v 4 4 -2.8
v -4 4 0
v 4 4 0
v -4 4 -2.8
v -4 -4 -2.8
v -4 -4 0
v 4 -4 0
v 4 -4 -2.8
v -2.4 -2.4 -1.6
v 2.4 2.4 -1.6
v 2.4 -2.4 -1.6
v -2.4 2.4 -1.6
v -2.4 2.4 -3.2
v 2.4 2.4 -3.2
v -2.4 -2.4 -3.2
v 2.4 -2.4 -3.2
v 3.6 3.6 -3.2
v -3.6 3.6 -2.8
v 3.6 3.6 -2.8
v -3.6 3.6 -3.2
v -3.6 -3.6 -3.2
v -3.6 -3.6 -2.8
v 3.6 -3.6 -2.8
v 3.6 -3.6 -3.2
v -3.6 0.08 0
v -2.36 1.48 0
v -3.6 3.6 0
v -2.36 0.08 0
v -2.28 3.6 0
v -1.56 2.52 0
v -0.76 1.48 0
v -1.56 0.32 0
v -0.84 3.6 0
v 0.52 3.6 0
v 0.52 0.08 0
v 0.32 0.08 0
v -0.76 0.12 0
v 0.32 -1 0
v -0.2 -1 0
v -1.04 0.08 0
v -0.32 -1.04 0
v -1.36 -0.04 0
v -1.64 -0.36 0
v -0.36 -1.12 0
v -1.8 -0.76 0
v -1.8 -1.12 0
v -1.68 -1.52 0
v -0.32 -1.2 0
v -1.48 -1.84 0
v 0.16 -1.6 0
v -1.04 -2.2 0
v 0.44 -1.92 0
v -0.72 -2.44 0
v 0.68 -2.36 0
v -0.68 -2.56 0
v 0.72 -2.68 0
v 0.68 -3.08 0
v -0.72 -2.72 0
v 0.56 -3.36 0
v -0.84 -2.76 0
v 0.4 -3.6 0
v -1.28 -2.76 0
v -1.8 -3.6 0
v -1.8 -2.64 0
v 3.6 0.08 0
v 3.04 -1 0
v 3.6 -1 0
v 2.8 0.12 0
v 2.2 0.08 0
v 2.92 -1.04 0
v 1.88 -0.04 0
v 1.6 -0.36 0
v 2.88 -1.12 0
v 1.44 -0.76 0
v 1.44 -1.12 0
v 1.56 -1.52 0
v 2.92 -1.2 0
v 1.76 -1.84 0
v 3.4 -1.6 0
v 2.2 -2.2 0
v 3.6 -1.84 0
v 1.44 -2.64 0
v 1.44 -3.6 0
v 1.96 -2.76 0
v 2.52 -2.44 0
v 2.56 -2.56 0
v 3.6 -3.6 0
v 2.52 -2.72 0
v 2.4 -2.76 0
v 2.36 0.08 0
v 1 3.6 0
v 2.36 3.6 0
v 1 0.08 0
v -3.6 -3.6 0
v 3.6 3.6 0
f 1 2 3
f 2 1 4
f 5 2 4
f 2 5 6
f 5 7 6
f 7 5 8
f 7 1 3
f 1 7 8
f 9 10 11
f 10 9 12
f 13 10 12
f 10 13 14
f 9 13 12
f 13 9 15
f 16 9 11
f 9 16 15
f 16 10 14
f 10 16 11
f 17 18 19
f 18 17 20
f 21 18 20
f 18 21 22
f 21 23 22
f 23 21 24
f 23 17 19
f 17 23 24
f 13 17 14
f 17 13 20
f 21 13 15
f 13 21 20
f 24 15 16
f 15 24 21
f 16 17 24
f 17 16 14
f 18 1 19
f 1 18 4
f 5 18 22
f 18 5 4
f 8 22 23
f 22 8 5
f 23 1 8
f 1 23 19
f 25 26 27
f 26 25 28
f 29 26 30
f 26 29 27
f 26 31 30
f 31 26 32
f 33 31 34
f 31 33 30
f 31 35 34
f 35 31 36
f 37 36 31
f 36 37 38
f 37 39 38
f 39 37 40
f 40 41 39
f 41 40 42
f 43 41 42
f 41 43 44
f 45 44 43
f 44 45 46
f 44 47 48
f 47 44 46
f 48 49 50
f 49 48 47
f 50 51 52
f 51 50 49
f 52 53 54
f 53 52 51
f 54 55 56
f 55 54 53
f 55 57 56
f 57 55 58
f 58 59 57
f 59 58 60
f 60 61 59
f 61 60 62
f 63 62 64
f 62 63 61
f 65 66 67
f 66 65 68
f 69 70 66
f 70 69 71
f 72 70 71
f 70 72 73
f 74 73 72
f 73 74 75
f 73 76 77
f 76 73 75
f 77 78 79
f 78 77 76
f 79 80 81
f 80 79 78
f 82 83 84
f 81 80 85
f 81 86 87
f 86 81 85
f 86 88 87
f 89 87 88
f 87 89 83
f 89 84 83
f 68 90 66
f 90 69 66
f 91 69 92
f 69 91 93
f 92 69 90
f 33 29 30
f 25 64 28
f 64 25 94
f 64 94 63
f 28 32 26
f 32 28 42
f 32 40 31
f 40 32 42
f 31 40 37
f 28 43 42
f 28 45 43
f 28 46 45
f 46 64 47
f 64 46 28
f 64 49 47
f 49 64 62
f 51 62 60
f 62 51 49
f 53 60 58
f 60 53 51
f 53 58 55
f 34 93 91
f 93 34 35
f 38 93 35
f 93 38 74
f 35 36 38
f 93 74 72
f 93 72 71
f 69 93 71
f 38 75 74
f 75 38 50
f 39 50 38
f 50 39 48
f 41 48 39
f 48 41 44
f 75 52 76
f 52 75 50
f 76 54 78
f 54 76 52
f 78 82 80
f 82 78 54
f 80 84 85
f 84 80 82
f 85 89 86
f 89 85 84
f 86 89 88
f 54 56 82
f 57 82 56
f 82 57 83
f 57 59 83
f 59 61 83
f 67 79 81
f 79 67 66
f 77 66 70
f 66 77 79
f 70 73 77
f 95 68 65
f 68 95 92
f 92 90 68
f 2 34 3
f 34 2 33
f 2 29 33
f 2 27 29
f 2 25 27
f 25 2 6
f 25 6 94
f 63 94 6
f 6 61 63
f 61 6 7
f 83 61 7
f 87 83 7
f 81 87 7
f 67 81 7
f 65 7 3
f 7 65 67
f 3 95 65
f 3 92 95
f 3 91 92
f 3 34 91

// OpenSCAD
// file: ../p/box5.scad
use <../lib.scad>
function ldraw_lib__box5() = [
// 0 Box with 5 Faces and All Edges
// 0 Name: box5.dat
// 0 Author: James Jessiman
// 0 !LDRAW_ORG Primitive UPDATE 2012-01
// 0 !LICENSE Licensed under CC BY 2.0 and CC BY 4.0 : see CAreadme.txt
// 
// 0 BFC CERTIFY CCW
  [0,"BFC","CERTIFY"],
  [0,"BFC","CCW"],
// 
// 0 !HISTORY 2002-04-03 [sbliss] Modified for BFC compliance
// 0 !HISTORY 2002-04-25 [PTadmin] Official Update 2002-02
// 0 !HISTORY 2007-06-24 [PTadmin] Header formatted for Contributor Agreement
// 0 !HISTORY 2008-07-01 [PTadmin] Official Update 2008-01
// 0 !HISTORY 2012-02-16 [Philo] Changed to CCW
// 0 !HISTORY 2012-03-30 [PTadmin] Official Update 2012-01
// 
// 
// 2 24 1 1 1 -1 1 1
  [2,24,1,1,1,-1,1,1],
// 2 24 -1 1 1 -1 1 -1
  [2,24,-1,1,1,-1,1,-1],
// 2 24 -1 1 -1 1 1 -1
  [2,24,-1,1,-1,1,1,-1],
// 2 24 1 1 -1 1 1 1
  [2,24,1,1,-1,1,1,1],
// 2 24 1 0 1 -1 0 1
  [2,24,1,0,1,-1,0,1],
// 2 24 -1 0 1 -1 0 -1
  [2,24,-1,0,1,-1,0,-1],
// 2 24 -1 0 -1 1 0 -1
  [2,24,-1,0,-1,1,0,-1],
// 2 24 1 0 -1 1 0 1
  [2,24,1,0,-1,1,0,1],
// 2 24 1 0 1 1 1 1
  [2,24,1,0,1,1,1,1],
// 2 24 -1 0 1 -1 1 1
  [2,24,-1,0,1,-1,1,1],
// 2 24 1 0 -1 1 1 -1
  [2,24,1,0,-1,1,1,-1],
// 2 24 -1 0 -1 -1 1 -1
  [2,24,-1,0,-1,-1,1,-1],
// 4 16 -1 1 1 1 1 1 1 1 -1 -1 1 -1
  [4,16,-1,1,1,1,1,1,1,1,-1,-1,1,-1],
// 4 16 -1 1 1 -1 0 1 1 0 1 1 1 1
  [4,16,-1,1,1,-1,0,1,1,0,1,1,1,1],
// 4 16 -1 1 -1 -1 0 -1 -1 0 1 -1 1 1
  [4,16,-1,1,-1,-1,0,-1,-1,0,1,-1,1,1],
// 4 16 1 1 -1 1 0 -1 -1 0 -1 -1 1 -1
  [4,16,1,1,-1,1,0,-1,-1,0,-1,-1,1,-1],
// 4 16 1 1 1 1 0 1 1 0 -1 1 1 -1
  [4,16,1,1,1,1,0,1,1,0,-1,1,1,-1],
];
makepoly(ldraw_lib__box5(), line=0.2);
// file: ../p/box4.scad
use <../lib.scad>
function ldraw_lib__box4() = [
// 0 Box with 4 Faces (2 Parallel Pairs) and All Edges
// 0 Name: box4.dat
// 0 Author: James Jessiman
// 0 !LDRAW_ORG Primitive UPDATE 2012-01
// 0 !LICENSE Licensed under CC BY 2.0 and CC BY 4.0 : see CAreadme.txt
// 
// 0 BFC CERTIFY CCW
  [0,"BFC","CERTIFY"],
  [0,"BFC","CCW"],
// 
// 0 !HISTORY 2002-04-03 [sbliss] Modified for BFC compliance
// 0 !HISTORY 2002-04-25 [PTadmin] Official Update 2002-02
// 0 !HISTORY 2007-06-24 [PTadmin] Header formatted for Contributor Agreement
// 0 !HISTORY 2008-07-01 [PTadmin] Official Update 2008-01
// 0 !HISTORY 2012-02-16 [Philo] Changed to CCW
// 0 !HISTORY 2012-03-30 [PTadmin] Official Update 2012-01
// 
// 
// 2 24 1 1 1 -1 1 1
  [2,24,1,1,1,-1,1,1],
// 2 24 -1 1 1 -1 1 -1
  [2,24,-1,1,1,-1,1,-1],
// 2 24 -1 1 -1 1 1 -1
  [2,24,-1,1,-1,1,1,-1],
// 2 24 1 1 -1 1 1 1
  [2,24,1,1,-1,1,1,1],
// 2 24 1 0 1 -1 0 1
  [2,24,1,0,1,-1,0,1],
// 2 24 -1 0 1 -1 0 -1
  [2,24,-1,0,1,-1,0,-1],
// 2 24 -1 0 -1 1 0 -1
  [2,24,-1,0,-1,1,0,-1],
// 2 24 1 0 -1 1 0 1
  [2,24,1,0,-1,1,0,1],
// 2 24 1 0 1 1 1 1
  [2,24,1,0,1,1,1,1],
// 2 24 -1 0 1 -1 1 1
  [2,24,-1,0,1,-1,1,1],
// 2 24 1 0 -1 1 1 -1
  [2,24,1,0,-1,1,1,-1],
// 2 24 -1 0 -1 -1 1 -1
  [2,24,-1,0,-1,-1,1,-1],
// 4 16 -1 1 1 -1 0 1 1 0 1 1 1 1
  [4,16,-1,1,1,-1,0,1,1,0,1,1,1,1],
// 4 16 -1 1 -1 -1 0 -1 -1 0 1 -1 1 1
  [4,16,-1,1,-1,-1,0,-1,-1,0,1,-1,1,1],
// 4 16 1 1 -1 1 0 -1 -1 0 -1 -1 1 -1
  [4,16,1,1,-1,1,0,-1,-1,0,-1,-1,1,-1],
// 4 16 1 1 1 1 0 1 1 0 -1 1 1 -1
  [4,16,1,1,1,1,0,1,1,0,-1,1,1,-1],
];
makepoly(ldraw_lib__box4(), line=0.2);
// file: s/3070bs01.scad
use <../../lib.scad>
use <../../p/box4.scad>
use <../../p/box5.scad>
function ldraw_lib__s__3070bs01() = [
// 0 ~Tile  1 x  1 with Groove without Top Face
// 0 Name: s\3070bs01.dat
// 0 Author: Chris Dee [cwdee]
// 0 !LDRAW_ORG Subpart UPDATE 2009-02
// 0 !LICENSE Licensed under CC BY 2.0 and CC BY 4.0 : see CAreadme.txt
// 
// 0 BFC CERTIFY CCW
  [0,"BFC","CERTIFY"],
  [0,"BFC","CCW"],
// 
// 0 !HISTORY 2009-09-03 [PTadmin] Official Update 2009-02
// 
// 
// 1 16 0 0 0 10 0 0 0 7 0 0 0 10 box4.dat
  [1,16,0,0,0,10,0,0,0,7,0,0,0,10, ldraw_lib__box4()],
// 0 BFC INVERTNEXT
  [0,"BFC","INVERTNEXT"],
// 1 16 0 8 0 6 0 0 0 -4 0 0 0 6 box5.dat
  [1,16,0,8,0,6,0,0,0,-4,0,0,0,6, ldraw_lib__box5()],
// 1 16 0 7 0 9 0 0 0 1 0 0 0 9 box4.dat
  [1,16,0,7,0,9,0,0,0,1,0,0,0,9, ldraw_lib__box4()],
// 
// 4 16 9 8 9 6 8 6 -6 8 6 -9 8 9
  [4,16,9,8,9,6,8,6,-6,8,6,-9,8,9],
// 4 16 -9 8 9 -6 8 6 -6 8 -6 -9 8 -9
  [4,16,-9,8,9,-6,8,6,-6,8,-6,-9,8,-9],
// 4 16 -9 8 -9 -6 8 -6 6 8 -6 9 8 -9
  [4,16,-9,8,-9,-6,8,-6,6,8,-6,9,8,-9],
// 4 16 9 8 -9 6 8 -6 6 8 6 9 8 9
  [4,16,9,8,-9,6,8,-6,6,8,6,9,8,9],
// 
// 4 16 10 7 10 9 7 9 -9 7 9 -10 7 10
  [4,16,10,7,10,9,7,9,-9,7,9,-10,7,10],
// 4 16 -10 7 10 -9 7 9 -9 7 -9 -10 7 -10
  [4,16,-10,7,10,-9,7,9,-9,7,-9,-10,7,-10],
// 4 16 -10 7 -10 -9 7 -9 9 7 -9 10 7 -10
  [4,16,-10,7,-10,-9,7,-9,9,7,-9,10,7,-10],
// 4 16 10 7 -10 9 7 -9 9 7 9 10 7 10
  [4,16,10,7,-10,9,7,-9,9,7,9,10,7,10],
// 0
];
makepoly(ldraw_lib__s__3070bs01(), line=0.2);
// main file
use <../lib.scad>
use <s/3070bs01.scad>
function ldraw_lib__3070bp17() = [
// 0 Tile  1 x  1 with Blue "MISS" on Dark Turquoise Background Pattern
// 0 Name: 3070bp17.dat
// 0 Author: Takeshi Takahashi [RainbowDolphin]
// 0 !LDRAW_ORG Part UPDATE 2022-01
// 0 !LICENSE Licensed under CC BY 2.0 and CC BY 4.0 : see CAreadme.txt
// 
// 0 BFC CERTIFY CCW
  [0,"BFC","CERTIFY"],
  [0,"BFC","CCW"],
// 
// 0 !KEYWORDS Bricklink 3070bpb157, Dots, Set 41916
// 
// 0 !HISTORY 2022-01-14 [PTadmin] Official Update 2022-01
// 
// 
// 1 16 0 0 0 1 0 0 0 1 0 0 0 1 s\3070bs01.dat
  [1,16,0,0,0,1,0,0,0,1,0,0,0,1, ldraw_lib__s__3070bs01()],
// 4 1 -9 0 9 -9 0 0.2 -5.9 0 0.2 -5.9 0 3.7
  [4,1,-9,0,9,-9,0,0.2,-5.9,0,0.2,-5.9,0,3.7],
// 4 1 -5.7 0 9 -9 0 9 -5.9 0 3.7 -3.9 0 6.3
  [4,1,-5.7,0,9,-9,0,9,-5.9,0,3.7,-3.9,0,6.3],
// 4 1 -3.9 0 6.3 -5.9 0 3.7 -3.9 0 0.8 -1.9 0 3.7
  [4,1,-3.9,0,6.3,-5.9,0,3.7,-3.9,0,0.8,-1.9,0,3.7],
// 4 1 -2.1 0 9 -3.9 0 6.3 -1.9 0 3.7 1.3 0 9
  [4,1,-2.1,0,9,-3.9,0,6.3,-1.9,0,3.7,1.3,0,9],
// 4 1 1.3 0 0.2 1.3 0 9 -1.9 0 3.7 0.8 0 0.2
  [4,1,1.3,0,0.2,1.3,0,9,-1.9,0,3.7,0.8,0,0.2],
// 4 1 0.8 0 0.2 -1.9 0 3.7 -1.9 0 0.3 0.8 0 -2.5
  [4,1,0.8,0,0.2,-1.9,0,3.7,-1.9,0,0.3,0.8,0,-2.5],
// 4 1 -0.5 0 -2.5 0.8 0 -2.5 -1.9 0 0.3 -2.6 0 0.2
  [4,1,-0.5,0,-2.5,0.8,0,-2.5,-1.9,0,0.3,-2.6,0,0.2],
// 4 1 -0.8 0 -2.6 -0.5 0 -2.5 -2.6 0 0.2 -3.4 0 -0.1
  [4,1,-0.8,0,-2.6,-0.5,0,-2.5,-2.6,0,0.2,-3.4,0,-0.1],
// 4 1 -0.9 0 -2.8 -0.8 0 -2.6 -3.4 0 -0.1 -4.1 0 -0.9
  [4,1,-0.9,0,-2.8,-0.8,0,-2.6,-3.4,0,-0.1,-4.1,0,-0.9],
// 4 1 -0.9 0 -2.8 -4.1 0 -0.9 -4.5 0 -1.9 -4.5 0 -2.8
  [4,1,-0.9,0,-2.8,-4.1,0,-0.9,-4.5,0,-1.9,-4.5,0,-2.8],
// 4 1 -0.9 0 -2.8 -4.5 0 -2.8 -4.2 0 -3.8 -0.8 0 -3
  [4,1,-0.9,0,-2.8,-4.5,0,-2.8,-4.2,0,-3.8,-0.8,0,-3],
// 4 1 -0.8 0 -3 -4.2 0 -3.8 -3.7 0 -4.6 0.4 0 -4
  [4,1,-0.8,0,-3,-4.2,0,-3.8,-3.7,0,-4.6,0.4,0,-4],
// 4 1 0.4 0 -4 -3.7 0 -4.6 -2.6 0 -5.5 1.1 0 -4.8
  [4,1,0.4,0,-4,-3.7,0,-4.6,-2.6,0,-5.5,1.1,0,-4.8],
// 4 1 1.1 0 -4.8 -2.6 0 -5.5 -1.8 0 -6.1 1.7 0 -5.9
  [4,1,1.1,0,-4.8,-2.6,0,-5.5,-1.8,0,-6.1,1.7,0,-5.9],
// 4 1 1.7 0 -5.9 -1.8 0 -6.1 -1.7 0 -6.4 1.8 0 -6.7
  [4,1,1.7,0,-5.9,-1.8,0,-6.1,-1.7,0,-6.4,1.8,0,-6.7],
// 4 1 1.8 0 -6.7 -1.7 0 -6.4 -1.8 0 -6.8 1.7 0 -7.7
  [4,1,1.8,0,-6.7,-1.7,0,-6.4,-1.8,0,-6.8,1.7,0,-7.7],
// 4 1 1.7 0 -7.7 -1.8 0 -6.8 -2.1 0 -6.9 1.4 0 -8.4
  [4,1,1.7,0,-7.7,-1.8,0,-6.8,-2.1,0,-6.9,1.4,0,-8.4],
// 4 1 1 0 -9 1.4 0 -8.4 -2.1 0 -6.9 -3.2 0 -6.9
  [4,1,1,0,-9,1.4,0,-8.4,-2.1,0,-6.9,-3.2,0,-6.9],
// 4 1 -4.5 0 -9 1 0 -9 -3.2 0 -6.9 -4.5 0 -6.6
  [4,1,-4.5,0,-9,1,0,-9,-3.2,0,-6.9,-4.5,0,-6.6],
// 4 1 9 0 -2.5 9 0 0.2 7 0 0.3 7.6 0 -2.5
  [4,1,9,0,-2.5,9,0,0.2,7,0,0.3,7.6,0,-2.5],
// 4 1 7.3 0 -2.6 7.6 0 -2.5 5.5 0 0.2 4.7 0 -0.1
  [4,1,7.3,0,-2.6,7.6,0,-2.5,5.5,0,0.2,4.7,0,-0.1],
// 4 1 7.2 0 -2.8 7.3 0 -2.6 4.7 0 -0.1 4 0 -0.9
  [4,1,7.2,0,-2.8,7.3,0,-2.6,4.7,0,-0.1,4,0,-0.9],
// 4 1 7.2 0 -2.8 4 0 -0.9 3.6 0 -1.9 3.6 0 -2.8
  [4,1,7.2,0,-2.8,4,0,-0.9,3.6,0,-1.9,3.6,0,-2.8],
// 4 1 7.2 0 -2.8 3.6 0 -2.8 3.9 0 -3.8 7.3 0 -3
  [4,1,7.2,0,-2.8,3.6,0,-2.8,3.9,0,-3.8,7.3,0,-3],
// 4 1 7.3 0 -3 3.9 0 -3.8 4.4 0 -4.6 8.5 0 -4
  [4,1,7.3,0,-3,3.9,0,-3.8,4.4,0,-4.6,8.5,0,-4],
// 4 1 8.5 0 -4 4.4 0 -4.6 5.5 0 -5.5 9 0 -4.6
  [4,1,8.5,0,-4,4.4,0,-4.6,5.5,0,-5.5,9,0,-4.6],
// 3 1 3.6 0 -6.6 3.6 0 -9 4.9 0 -6.9
  [3,1,3.6,0,-6.6,3.6,0,-9,4.9,0,-6.9],
// 3 1 9 0 -4.6 5.5 0 -5.5 6.3 0 -6.1
  [3,1,9,0,-4.6,5.5,0,-5.5,6.3,0,-6.1],
// 4 1 9 0 -4.6 6.3 0 -6.1 6.4 0 -6.4 9 0 -9
  [4,1,9,0,-4.6,6.3,0,-6.1,6.4,0,-6.4,9,0,-9],
// 3 1 6.4 0 -6.4 6.3 0 -6.8 9 0 -9
  [3,1,6.4,0,-6.4,6.3,0,-6.8,9,0,-9],
// 4 1 9 0 -9 6.3 0 -6.8 6 0 -6.9 3.6 0 -9
  [4,1,9,0,-9,6.3,0,-6.8,6,0,-6.9,3.6,0,-9],
// 3 1 6 0 -6.9 4.9 0 -6.9 3.6 0 -9
  [3,1,6,0,-6.9,4.9,0,-6.9,3.6,0,-9],
// 3 1 7 0 0.3 5.9 0 0.2 7.6 0 -2.5
  [3,1,7,0,0.3,5.9,0,0.2,7.6,0,-2.5],
// 3 1 5.9 0 0.2 5.5 0 0.2 7.6 0 -2.5
  [3,1,5.9,0,0.2,5.5,0,0.2,7.6,0,-2.5],
// 4 1 5.9 0 9 2.5 0 9 2.5 0 0.2 5.5 0 0.2
  [4,1,5.9,0,9,2.5,0,9,2.5,0,0.2,5.5,0,0.2],
// 3 1 5.9 0 9 5.5 0 0.2 5.9 0 0.2
  [3,1,5.9,0,9,5.5,0,0.2,5.9,0,0.2],
// 3 3 -2.1 0 9 -5.7 0 9 -3.9 0 6.3
  [3,3,-2.1,0,9,-5.7,0,9,-3.9,0,6.3],
// 4 3 -5.9 0 0.2 -9 0 0.2 -9 0 -9 -4.5 0 -6.6
  [4,3,-5.9,0,0.2,-9,0,0.2,-9,0,-9,-4.5,0,-6.6],
// 3 3 -4.5 0 -6.6 -9 0 -9 -4.5 0 -9
  [3,3,-4.5,0,-6.6,-9,0,-9,-4.5,0,-9],
// 4 3 -3.9 0 0.8 -5.9 0 3.7 -5.9 0 0.2 -3.4 0 -0.1
  [4,3,-3.9,0,0.8,-5.9,0,3.7,-5.9,0,0.2,-3.4,0,-0.1],
// 4 3 -1.9 0 3.7 -3.9 0 0.8 -3.4 0 -0.1 -2.6 0 0.2
  [4,3,-1.9,0,3.7,-3.9,0,0.8,-3.4,0,-0.1,-2.6,0,0.2],
// 3 3 -1.9 0 3.7 -2.6 0 0.2 -1.9 0 0.3
  [3,3,-1.9,0,3.7,-2.6,0,0.2,-1.9,0,0.3],
// 3 3 -5.9 0 0.2 -4.1 0 -0.9 -3.4 0 -0.1
  [3,3,-5.9,0,0.2,-4.1,0,-0.9,-3.4,0,-0.1],
// 3 3 -5.9 0 0.2 -4.5 0 -1.9 -4.1 0 -0.9
  [3,3,-5.9,0,0.2,-4.5,0,-1.9,-4.1,0,-0.9],
// 3 3 -5.9 0 0.2 -4.5 0 -2.8 -4.5 0 -1.9
  [3,3,-5.9,0,0.2,-4.5,0,-2.8,-4.5,0,-1.9],
// 4 3 -4.5 0 -2.8 -5.9 0 0.2 -4.5 0 -6.6 -4.2 0 -3.8
  [4,3,-4.5,0,-2.8,-5.9,0,0.2,-4.5,0,-6.6,-4.2,0,-3.8],
// 4 3 -3.7 0 -4.6 -4.2 0 -3.8 -4.5 0 -6.6 -3.2 0 -6.9
  [4,3,-3.7,0,-4.6,-4.2,0,-3.8,-4.5,0,-6.6,-3.2,0,-6.9],
// 4 3 -2.6 0 -5.5 -3.7 0 -4.6 -3.2 0 -6.9 -2.1 0 -6.9
  [4,3,-2.6,0,-5.5,-3.7,0,-4.6,-3.2,0,-6.9,-2.1,0,-6.9],
// 4 3 -1.8 0 -6.1 -2.6 0 -5.5 -2.1 0 -6.9 -1.8 0 -6.8
  [4,3,-1.8,0,-6.1,-2.6,0,-5.5,-2.1,0,-6.9,-1.8,0,-6.8],
// 3 3 -1.8 0 -6.1 -1.8 0 -6.8 -1.7 0 -6.4
  [3,3,-1.8,0,-6.1,-1.8,0,-6.8,-1.7,0,-6.4],
// 4 3 2.5 0 9 1.3 0 9 1.3 0 0.2 2.5 0 0.2
  [4,3,2.5,0,9,1.3,0,9,1.3,0,0.2,2.5,0,0.2],
// 4 3 2.5 0 0.2 1.3 0 0.2 0.8 0 -2.5 3.6 0 -1.9
  [4,3,2.5,0,0.2,1.3,0,0.2,0.8,0,-2.5,3.6,0,-1.9],
// 3 3 1.3 0 0.2 0.8 0 0.2 0.8 0 -2.5
  [3,3,1.3,0,0.2,0.8,0,0.2,0.8,0,-2.5],
// 3 3 2.5 0 0.2 3.6 0 -1.9 4 0 -0.9
  [3,3,2.5,0,0.2,3.6,0,-1.9,4,0,-0.9],
// 3 3 2.5 0 0.2 4 0 -0.9 4.7 0 -0.1
  [3,3,2.5,0,0.2,4,0,-0.9,4.7,0,-0.1],
// 3 3 5.5 0 0.2 2.5 0 0.2 4.7 0 -0.1
  [3,3,5.5,0,0.2,2.5,0,0.2,4.7,0,-0.1],
// 4 3 3.6 0 -2.8 3.6 0 -1.9 0.8 0 -2.5 0.4 0 -4
  [4,3,3.6,0,-2.8,3.6,0,-1.9,0.8,0,-2.5,0.4,0,-4],
// 4 3 0.4 0 -4 0.8 0 -2.5 -0.5 0 -2.5 -0.8 0 -3
  [4,3,0.4,0,-4,0.8,0,-2.5,-0.5,0,-2.5,-0.8,0,-3],
// 4 3 -0.8 0 -3 -0.5 0 -2.5 -0.8 0 -2.6 -0.9 0 -2.8
  [4,3,-0.8,0,-3,-0.5,0,-2.5,-0.8,0,-2.6,-0.9,0,-2.8],
// 4 3 3.9 0 -3.8 3.6 0 -2.8 0.4 0 -4 1.1 0 -4.8
  [4,3,3.9,0,-3.8,3.6,0,-2.8,0.4,0,-4,1.1,0,-4.8],
// 4 3 4.4 0 -4.6 3.9 0 -3.8 1.1 0 -4.8 1.7 0 -5.9
  [4,3,4.4,0,-4.6,3.9,0,-3.8,1.1,0,-4.8,1.7,0,-5.9],
// 4 3 4.4 0 -4.6 1.7 0 -5.9 3.6 0 -6.6 5.5 0 -5.5
  [4,3,4.4,0,-4.6,1.7,0,-5.9,3.6,0,-6.6,5.5,0,-5.5],
// 4 3 5.5 0 -5.5 3.6 0 -6.6 4.9 0 -6.9 6.3 0 -6.1
  [4,3,5.5,0,-5.5,3.6,0,-6.6,4.9,0,-6.9,6.3,0,-6.1],
// 4 3 6.3 0 -6.1 4.9 0 -6.9 6 0 -6.9 6.4 0 -6.4
  [4,3,6.3,0,-6.1,4.9,0,-6.9,6,0,-6.9,6.4,0,-6.4],
// 3 3 6.4 0 -6.4 6 0 -6.9 6.3 0 -6.8
  [3,3,6.4,0,-6.4,6,0,-6.9,6.3,0,-6.8],
// 3 3 1.7 0 -5.9 1.8 0 -6.7 3.6 0 -6.6
  [3,3,1.7,0,-5.9,1.8,0,-6.7,3.6,0,-6.6],
// 4 3 3.6 0 -6.6 1.8 0 -6.7 1.7 0 -7.7 3.6 0 -9
  [4,3,3.6,0,-6.6,1.8,0,-6.7,1.7,0,-7.7,3.6,0,-9],
// 3 3 1.7 0 -7.7 1.4 0 -8.4 3.6 0 -9
  [3,3,1.7,0,-7.7,1.4,0,-8.4,3.6,0,-9],
// 3 3 1.4 0 -8.4 1 0 -9 3.6 0 -9
  [3,3,1.4,0,-8.4,1,0,-9,3.6,0,-9],
// 4 3 8.5 0 -4 9 0 -4.6 9 0 -2.5 7.6 0 -2.5
  [4,3,8.5,0,-4,9,0,-4.6,9,0,-2.5,7.6,0,-2.5],
// 4 3 7.3 0 -3 8.5 0 -4 7.6 0 -2.5 7.3 0 -2.6
  [4,3,7.3,0,-3,8.5,0,-4,7.6,0,-2.5,7.3,0,-2.6],
// 3 3 7.3 0 -2.6 7.2 0 -2.8 7.3 0 -3
  [3,3,7.3,0,-2.6,7.2,0,-2.8,7.3,0,-3],
// 4 3 9 0 0.2 9 0 9 5.9 0 9 7 0 0.3
  [4,3,9,0,0.2,9,0,9,5.9,0,9,7,0,0.3],
// 3 3 5.9 0 9 5.9 0 0.2 7 0 0.3
  [3,3,5.9,0,9,5.9,0,0.2,7,0,0.3],
// 4 16 1.3 0 9 10 0 10 -10 0 10 -2.1 0 9
  [4,16,1.3,0,9,10,0,10,-10,0,10,-2.1,0,9],
// 3 16 -10 0 10 -5.7 0 9 -2.1 0 9
  [3,16,-10,0,10,-5.7,0,9,-2.1,0,9],
// 3 16 -10 0 10 -9 0 9 -5.7 0 9
  [3,16,-10,0,10,-9,0,9,-5.7,0,9],
// 4 16 -9 0 0.2 -9 0 9 -10 0 10 -10 0 -10
  [4,16,-9,0,0.2,-9,0,9,-10,0,10,-10,0,-10],
// 3 16 -9 0 0.2 -10 0 -10 -9 0 -9
  [3,16,-9,0,0.2,-10,0,-10,-9,0,-9],
// 3 16 -4.5 0 -9 -9 0 -9 -10 0 -10
  [3,16,-4.5,0,-9,-9,0,-9,-10,0,-10],
// 4 16 1 0 -9 -4.5 0 -9 -10 0 -10 10 0 -10
  [4,16,1,0,-9,-4.5,0,-9,-10,0,-10,10,0,-10],
// 3 16 3.6 0 -9 1 0 -9 10 0 -10
  [3,16,3.6,0,-9,1,0,-9,10,0,-10],
// 3 16 9 0 -9 3.6 0 -9 10 0 -10
  [3,16,9,0,-9,3.6,0,-9,10,0,-10],
// 3 16 9 0 -4.6 9 0 -9 10 0 -10
  [3,16,9,0,-4.6,9,0,-9,10,0,-10],
// 3 16 9 0 -2.5 9 0 -4.6 10 0 -10
  [3,16,9,0,-2.5,9,0,-4.6,10,0,-10],
// 4 16 9 0 0.2 9 0 -2.5 10 0 -10 10 0 10
  [4,16,9,0,0.2,9,0,-2.5,10,0,-10,10,0,10],
// 3 16 10 0 10 9 0 9 9 0 0.2
  [3,16,10,0,10,9,0,9,9,0,0.2],
// 3 16 10 0 10 5.9 0 9 9 0 9
  [3,16,10,0,10,5.9,0,9,9,0,9],
// 3 16 10 0 10 2.5 0 9 5.9 0 9
  [3,16,10,0,10,2.5,0,9,5.9,0,9],
// 3 16 10 0 10 1.3 0 9 2.5 0 9
  [3,16,10,0,10,1.3,0,9,2.5,0,9],
];
makepoly(ldraw_lib__3070bp17(), line=0.2);
